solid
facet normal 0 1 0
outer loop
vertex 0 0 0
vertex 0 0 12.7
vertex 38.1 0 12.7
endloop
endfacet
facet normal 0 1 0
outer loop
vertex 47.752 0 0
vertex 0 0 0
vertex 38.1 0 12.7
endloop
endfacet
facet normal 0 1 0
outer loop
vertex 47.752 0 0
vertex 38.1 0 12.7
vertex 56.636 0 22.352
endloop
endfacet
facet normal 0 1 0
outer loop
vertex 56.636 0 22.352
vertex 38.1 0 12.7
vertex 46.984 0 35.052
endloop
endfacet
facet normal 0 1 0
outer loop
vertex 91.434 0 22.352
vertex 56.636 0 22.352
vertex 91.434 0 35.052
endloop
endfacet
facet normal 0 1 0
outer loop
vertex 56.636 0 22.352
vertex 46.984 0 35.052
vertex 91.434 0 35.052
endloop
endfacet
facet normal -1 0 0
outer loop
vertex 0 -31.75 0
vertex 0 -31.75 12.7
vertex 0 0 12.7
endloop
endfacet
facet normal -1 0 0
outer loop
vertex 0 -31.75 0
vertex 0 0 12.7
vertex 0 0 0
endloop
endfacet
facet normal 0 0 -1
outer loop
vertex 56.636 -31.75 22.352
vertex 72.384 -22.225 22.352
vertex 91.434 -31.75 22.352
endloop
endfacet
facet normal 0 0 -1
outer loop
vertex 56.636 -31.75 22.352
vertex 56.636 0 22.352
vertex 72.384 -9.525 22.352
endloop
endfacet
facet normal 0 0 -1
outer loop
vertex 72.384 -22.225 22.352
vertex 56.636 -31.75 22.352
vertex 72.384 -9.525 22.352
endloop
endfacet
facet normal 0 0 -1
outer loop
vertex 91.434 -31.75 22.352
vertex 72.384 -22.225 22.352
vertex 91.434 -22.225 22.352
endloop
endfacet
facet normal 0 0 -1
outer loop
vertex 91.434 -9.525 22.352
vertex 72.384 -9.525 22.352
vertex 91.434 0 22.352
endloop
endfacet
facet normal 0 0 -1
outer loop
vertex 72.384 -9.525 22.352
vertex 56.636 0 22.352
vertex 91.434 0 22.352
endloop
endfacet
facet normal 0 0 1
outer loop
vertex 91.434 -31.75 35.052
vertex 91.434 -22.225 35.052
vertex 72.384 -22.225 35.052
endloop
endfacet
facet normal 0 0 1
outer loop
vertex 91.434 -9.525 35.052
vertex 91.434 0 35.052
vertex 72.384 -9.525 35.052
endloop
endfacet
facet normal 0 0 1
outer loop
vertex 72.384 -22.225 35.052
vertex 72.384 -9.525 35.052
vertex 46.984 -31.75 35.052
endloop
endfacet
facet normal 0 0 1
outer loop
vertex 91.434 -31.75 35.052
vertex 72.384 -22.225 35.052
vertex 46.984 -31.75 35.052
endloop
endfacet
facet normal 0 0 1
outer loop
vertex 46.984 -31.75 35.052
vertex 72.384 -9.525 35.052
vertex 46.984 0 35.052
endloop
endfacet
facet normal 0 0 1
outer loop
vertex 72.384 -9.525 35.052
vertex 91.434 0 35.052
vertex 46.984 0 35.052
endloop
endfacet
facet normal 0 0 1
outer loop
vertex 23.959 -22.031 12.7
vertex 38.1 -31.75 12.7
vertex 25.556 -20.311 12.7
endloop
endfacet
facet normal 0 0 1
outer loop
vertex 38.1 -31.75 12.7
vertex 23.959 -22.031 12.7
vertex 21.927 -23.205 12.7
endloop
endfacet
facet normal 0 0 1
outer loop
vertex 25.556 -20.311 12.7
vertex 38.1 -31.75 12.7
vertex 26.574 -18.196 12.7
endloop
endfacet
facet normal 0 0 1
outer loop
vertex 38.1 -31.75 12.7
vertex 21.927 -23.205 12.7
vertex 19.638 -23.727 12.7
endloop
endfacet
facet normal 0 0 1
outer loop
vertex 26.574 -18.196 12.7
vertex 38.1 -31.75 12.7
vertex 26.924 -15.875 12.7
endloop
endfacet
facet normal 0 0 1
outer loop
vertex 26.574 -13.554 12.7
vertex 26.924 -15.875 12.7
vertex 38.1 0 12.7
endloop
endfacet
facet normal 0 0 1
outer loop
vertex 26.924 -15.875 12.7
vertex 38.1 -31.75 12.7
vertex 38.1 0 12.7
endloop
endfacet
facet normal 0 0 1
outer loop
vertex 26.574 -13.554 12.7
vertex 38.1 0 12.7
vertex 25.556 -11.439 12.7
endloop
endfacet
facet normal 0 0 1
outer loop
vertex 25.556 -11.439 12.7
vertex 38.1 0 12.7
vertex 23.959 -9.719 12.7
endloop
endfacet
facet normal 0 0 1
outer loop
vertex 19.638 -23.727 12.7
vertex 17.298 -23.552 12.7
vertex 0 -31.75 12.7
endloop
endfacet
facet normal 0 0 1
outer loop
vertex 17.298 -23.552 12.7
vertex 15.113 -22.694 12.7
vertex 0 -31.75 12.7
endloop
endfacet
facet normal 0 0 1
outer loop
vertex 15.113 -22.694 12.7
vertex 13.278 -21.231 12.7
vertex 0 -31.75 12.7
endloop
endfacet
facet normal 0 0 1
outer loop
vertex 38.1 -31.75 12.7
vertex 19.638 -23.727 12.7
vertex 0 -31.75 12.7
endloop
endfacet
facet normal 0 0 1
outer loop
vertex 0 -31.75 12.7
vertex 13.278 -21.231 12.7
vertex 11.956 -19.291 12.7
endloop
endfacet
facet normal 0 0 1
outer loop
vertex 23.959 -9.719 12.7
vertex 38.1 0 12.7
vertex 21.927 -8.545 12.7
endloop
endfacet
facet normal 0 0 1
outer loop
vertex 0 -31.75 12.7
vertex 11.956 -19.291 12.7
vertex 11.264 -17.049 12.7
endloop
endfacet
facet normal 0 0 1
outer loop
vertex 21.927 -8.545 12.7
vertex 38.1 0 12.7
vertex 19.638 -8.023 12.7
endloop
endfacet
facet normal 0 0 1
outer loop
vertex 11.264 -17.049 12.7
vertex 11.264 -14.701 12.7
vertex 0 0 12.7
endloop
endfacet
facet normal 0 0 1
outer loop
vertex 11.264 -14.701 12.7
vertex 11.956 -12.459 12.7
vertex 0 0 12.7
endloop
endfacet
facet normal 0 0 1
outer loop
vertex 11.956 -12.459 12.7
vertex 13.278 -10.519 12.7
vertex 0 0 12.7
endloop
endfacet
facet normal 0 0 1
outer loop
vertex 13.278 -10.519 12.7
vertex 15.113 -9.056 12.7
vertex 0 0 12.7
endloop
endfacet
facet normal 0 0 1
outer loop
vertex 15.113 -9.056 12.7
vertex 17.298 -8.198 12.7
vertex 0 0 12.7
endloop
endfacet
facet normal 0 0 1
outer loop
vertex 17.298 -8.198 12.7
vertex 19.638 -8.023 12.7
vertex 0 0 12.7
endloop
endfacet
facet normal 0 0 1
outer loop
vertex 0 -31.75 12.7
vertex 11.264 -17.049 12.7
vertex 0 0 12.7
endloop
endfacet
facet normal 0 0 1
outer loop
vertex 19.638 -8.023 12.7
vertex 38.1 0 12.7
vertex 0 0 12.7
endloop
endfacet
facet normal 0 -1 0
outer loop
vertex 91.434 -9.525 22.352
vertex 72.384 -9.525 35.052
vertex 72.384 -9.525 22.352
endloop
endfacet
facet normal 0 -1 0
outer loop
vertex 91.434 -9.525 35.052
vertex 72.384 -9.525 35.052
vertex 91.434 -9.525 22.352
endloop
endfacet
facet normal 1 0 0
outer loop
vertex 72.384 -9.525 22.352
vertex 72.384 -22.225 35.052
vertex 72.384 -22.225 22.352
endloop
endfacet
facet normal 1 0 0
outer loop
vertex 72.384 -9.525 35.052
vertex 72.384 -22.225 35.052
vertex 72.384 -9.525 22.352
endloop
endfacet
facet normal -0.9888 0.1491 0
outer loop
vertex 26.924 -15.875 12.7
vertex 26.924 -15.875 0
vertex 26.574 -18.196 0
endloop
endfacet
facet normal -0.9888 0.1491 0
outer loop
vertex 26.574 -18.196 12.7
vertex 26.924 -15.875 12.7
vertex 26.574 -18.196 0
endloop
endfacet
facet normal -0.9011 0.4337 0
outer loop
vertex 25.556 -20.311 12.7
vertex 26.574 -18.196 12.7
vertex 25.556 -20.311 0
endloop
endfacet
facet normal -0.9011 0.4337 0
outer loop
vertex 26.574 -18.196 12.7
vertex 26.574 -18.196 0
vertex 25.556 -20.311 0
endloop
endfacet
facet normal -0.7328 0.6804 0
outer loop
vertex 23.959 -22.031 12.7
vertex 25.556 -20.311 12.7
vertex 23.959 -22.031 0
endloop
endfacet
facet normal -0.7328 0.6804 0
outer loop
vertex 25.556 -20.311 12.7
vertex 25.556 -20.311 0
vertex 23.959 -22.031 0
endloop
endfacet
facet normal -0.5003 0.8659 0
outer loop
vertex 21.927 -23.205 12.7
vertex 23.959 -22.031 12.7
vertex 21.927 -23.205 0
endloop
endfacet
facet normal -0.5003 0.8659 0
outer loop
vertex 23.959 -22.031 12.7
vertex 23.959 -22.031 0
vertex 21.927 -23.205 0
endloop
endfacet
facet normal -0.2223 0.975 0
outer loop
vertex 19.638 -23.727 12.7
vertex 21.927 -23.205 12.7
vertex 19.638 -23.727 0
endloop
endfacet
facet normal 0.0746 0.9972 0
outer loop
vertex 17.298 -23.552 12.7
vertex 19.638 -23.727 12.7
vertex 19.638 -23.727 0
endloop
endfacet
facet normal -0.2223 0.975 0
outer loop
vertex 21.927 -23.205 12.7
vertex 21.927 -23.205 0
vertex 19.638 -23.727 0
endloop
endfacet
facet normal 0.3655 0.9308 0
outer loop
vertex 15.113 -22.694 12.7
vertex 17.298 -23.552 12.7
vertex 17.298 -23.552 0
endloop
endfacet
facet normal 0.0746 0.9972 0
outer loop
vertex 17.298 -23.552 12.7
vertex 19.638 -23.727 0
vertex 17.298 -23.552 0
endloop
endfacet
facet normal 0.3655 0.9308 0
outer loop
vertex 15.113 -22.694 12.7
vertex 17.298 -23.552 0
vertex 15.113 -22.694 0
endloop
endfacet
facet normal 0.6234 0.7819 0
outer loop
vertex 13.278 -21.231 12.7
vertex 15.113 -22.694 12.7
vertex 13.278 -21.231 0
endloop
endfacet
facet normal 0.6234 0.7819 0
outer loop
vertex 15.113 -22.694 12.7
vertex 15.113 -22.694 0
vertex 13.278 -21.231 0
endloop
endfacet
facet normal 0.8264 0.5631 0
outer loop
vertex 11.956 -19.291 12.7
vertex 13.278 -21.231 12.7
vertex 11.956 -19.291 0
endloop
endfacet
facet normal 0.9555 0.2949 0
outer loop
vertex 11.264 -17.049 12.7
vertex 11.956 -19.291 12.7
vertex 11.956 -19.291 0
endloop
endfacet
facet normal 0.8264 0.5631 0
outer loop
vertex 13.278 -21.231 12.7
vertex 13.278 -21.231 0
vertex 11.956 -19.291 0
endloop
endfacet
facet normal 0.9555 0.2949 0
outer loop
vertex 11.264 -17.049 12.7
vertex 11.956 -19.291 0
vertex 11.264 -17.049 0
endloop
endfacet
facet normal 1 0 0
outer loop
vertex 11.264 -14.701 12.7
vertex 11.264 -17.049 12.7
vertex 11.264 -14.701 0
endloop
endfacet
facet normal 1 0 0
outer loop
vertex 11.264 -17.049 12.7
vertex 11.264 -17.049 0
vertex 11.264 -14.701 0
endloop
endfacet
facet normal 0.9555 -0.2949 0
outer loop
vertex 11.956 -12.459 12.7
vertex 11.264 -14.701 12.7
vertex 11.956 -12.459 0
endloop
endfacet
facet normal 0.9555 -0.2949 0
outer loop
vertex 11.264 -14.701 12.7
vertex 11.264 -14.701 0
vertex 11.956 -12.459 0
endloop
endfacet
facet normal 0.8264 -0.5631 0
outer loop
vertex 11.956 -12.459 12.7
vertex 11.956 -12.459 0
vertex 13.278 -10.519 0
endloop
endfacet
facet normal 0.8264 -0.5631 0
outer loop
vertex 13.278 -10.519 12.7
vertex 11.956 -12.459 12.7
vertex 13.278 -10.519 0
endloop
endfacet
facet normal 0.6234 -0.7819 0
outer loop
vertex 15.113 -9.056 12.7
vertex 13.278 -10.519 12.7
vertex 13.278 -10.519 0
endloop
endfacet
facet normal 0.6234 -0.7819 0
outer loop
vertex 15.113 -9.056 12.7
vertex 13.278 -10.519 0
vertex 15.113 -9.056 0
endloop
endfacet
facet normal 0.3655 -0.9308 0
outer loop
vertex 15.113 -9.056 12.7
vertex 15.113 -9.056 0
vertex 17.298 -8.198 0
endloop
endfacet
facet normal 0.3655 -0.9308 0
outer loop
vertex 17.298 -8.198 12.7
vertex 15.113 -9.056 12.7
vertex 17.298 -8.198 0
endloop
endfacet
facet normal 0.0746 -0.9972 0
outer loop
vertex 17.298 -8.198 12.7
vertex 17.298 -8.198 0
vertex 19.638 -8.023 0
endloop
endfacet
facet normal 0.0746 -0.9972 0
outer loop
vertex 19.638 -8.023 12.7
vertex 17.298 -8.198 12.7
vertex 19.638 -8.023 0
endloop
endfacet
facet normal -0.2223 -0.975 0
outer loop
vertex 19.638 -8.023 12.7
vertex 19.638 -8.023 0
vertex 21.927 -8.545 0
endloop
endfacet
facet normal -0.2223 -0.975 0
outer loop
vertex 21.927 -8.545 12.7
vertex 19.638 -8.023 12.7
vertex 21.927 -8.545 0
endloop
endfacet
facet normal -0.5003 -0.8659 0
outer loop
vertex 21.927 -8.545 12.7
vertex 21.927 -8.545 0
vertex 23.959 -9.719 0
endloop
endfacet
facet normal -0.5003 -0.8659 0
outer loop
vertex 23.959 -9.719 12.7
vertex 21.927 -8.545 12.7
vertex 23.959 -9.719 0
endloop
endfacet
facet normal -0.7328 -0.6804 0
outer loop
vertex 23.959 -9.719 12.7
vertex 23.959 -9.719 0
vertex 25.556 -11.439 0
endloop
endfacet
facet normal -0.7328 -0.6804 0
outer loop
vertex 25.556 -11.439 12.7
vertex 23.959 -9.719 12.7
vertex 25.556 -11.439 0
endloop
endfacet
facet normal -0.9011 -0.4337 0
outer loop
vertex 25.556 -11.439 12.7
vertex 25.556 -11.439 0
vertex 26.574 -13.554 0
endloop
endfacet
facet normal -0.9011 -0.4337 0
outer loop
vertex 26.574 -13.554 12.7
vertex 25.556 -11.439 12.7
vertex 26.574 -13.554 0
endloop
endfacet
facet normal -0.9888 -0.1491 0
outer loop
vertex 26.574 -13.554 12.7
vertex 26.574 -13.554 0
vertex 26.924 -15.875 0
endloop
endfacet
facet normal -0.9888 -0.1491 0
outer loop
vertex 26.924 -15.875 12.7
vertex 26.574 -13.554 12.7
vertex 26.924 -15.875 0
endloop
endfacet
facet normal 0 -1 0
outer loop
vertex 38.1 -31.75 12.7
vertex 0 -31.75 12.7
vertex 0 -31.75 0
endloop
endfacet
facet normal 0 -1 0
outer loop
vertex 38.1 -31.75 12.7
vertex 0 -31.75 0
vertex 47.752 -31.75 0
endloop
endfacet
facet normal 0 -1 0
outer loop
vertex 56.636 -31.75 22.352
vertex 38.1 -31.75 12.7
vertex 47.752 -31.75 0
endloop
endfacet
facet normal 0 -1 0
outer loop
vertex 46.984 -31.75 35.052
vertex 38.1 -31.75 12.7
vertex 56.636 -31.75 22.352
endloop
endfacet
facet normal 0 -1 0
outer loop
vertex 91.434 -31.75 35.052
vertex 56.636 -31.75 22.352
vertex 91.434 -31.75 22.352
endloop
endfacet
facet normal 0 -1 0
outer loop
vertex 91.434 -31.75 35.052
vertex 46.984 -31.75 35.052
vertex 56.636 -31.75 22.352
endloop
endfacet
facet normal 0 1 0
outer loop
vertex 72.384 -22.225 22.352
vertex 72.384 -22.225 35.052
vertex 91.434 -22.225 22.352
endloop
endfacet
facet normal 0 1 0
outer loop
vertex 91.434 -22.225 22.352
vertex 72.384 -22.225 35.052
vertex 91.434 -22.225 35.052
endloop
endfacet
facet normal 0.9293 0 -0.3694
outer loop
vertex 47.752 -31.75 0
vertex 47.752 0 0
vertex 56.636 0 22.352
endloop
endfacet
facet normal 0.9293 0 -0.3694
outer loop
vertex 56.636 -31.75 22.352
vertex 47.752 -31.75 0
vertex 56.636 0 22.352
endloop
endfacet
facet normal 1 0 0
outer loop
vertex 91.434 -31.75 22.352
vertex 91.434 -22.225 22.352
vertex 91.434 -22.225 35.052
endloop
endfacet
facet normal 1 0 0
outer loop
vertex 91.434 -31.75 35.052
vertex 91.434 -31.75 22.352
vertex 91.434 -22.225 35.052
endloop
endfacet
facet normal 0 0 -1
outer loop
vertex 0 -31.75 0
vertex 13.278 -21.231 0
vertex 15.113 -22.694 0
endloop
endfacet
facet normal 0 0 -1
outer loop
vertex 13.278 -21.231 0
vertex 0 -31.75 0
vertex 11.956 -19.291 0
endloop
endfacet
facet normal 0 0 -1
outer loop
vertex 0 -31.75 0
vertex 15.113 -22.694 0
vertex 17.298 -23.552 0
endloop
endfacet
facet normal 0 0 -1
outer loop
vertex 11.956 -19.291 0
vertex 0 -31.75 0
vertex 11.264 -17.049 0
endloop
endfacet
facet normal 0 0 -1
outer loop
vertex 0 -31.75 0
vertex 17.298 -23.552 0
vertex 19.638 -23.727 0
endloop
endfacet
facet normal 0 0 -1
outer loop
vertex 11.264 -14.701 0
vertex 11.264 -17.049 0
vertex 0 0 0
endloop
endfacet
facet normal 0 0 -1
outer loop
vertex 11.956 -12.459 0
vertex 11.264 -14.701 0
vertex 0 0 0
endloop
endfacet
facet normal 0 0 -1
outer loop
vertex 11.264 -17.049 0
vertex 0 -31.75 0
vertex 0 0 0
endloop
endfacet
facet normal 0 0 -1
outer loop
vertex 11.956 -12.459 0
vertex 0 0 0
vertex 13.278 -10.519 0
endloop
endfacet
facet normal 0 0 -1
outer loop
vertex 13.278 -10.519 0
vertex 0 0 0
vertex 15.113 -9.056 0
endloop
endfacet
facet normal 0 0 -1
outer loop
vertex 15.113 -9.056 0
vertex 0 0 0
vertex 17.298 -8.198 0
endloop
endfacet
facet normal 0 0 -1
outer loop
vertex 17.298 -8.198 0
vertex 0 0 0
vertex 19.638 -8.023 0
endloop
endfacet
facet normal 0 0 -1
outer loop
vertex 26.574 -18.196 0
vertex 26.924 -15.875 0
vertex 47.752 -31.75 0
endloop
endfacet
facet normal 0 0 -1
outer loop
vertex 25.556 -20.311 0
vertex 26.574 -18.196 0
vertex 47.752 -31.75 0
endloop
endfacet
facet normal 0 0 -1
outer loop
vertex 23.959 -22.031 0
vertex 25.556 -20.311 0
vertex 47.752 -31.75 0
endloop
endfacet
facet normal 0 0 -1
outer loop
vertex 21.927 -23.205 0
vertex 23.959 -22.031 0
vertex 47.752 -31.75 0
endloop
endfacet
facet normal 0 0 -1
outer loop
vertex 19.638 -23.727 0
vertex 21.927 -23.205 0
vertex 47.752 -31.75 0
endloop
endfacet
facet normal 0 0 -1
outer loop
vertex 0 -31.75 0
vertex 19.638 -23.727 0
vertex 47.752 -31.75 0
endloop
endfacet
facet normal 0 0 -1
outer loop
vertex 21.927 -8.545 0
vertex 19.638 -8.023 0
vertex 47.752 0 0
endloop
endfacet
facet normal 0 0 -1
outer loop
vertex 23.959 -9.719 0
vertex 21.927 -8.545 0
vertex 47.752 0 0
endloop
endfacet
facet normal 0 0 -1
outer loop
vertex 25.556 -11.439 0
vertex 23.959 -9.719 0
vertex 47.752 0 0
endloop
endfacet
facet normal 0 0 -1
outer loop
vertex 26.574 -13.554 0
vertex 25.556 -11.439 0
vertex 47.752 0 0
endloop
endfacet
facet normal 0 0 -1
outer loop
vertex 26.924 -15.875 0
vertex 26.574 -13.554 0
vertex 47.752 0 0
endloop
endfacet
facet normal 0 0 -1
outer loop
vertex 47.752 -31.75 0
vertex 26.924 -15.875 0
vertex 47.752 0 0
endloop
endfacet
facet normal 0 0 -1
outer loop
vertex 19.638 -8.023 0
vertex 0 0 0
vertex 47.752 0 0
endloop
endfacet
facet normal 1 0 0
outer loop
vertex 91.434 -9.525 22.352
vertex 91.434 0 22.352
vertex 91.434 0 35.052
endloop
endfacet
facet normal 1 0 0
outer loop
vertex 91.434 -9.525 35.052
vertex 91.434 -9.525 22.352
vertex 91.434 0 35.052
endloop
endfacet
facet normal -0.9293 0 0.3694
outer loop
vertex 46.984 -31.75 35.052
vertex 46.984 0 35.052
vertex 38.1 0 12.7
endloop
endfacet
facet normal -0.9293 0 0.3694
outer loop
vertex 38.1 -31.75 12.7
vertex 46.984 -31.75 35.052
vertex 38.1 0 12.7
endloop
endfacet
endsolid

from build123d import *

# Parameters (mm, degrees)
F1_DEPTH = 31.75
F2_W     = 19.05
F2_H     = 12.7
F3_DEPTH = 35.053
F5_DEPTH = 35.053


with BuildPart() as f1:
    # F0 (on Front) → F1 (new body)
    with BuildSketch(Plane.XZ):
        Polygon((0, 12.7), (0, 0), (47.752, 0), (56.636066, 22.352), (91.434066, 22.352), (91.434066, 35.052), (46.984066, 35.052), (38.1, 12.7), align=None)
    extrude(amount=F1_DEPTH)

    # F2 (on face) → F3 (cut, through all)
    with BuildSketch(Plane.XY.offset(35.052)):
        with Locations((81.909066, -15.875)):
            Rectangle(F2_W, F2_H)
    extrude(amount=-F3_DEPTH, mode=Mode.SUBTRACT)

    # F4 (on face) → F5 (cut, through all)
    with BuildSketch(Plane(origin=(0, 0, 0), x_dir=(1, 0, 0), z_dir=(0, 0, -1))):
        with BuildLine():
            ThreePointArc((11.176, 15.875), (19.05, 8.001), (26.924, 15.875))
            ThreePointArc((26.924, 15.875), (19.05, 23.749), (11.176, 15.875))
        make_face()
    extrude(amount=-F5_DEPTH, mode=Mode.SUBTRACT)


solid = f1.part
